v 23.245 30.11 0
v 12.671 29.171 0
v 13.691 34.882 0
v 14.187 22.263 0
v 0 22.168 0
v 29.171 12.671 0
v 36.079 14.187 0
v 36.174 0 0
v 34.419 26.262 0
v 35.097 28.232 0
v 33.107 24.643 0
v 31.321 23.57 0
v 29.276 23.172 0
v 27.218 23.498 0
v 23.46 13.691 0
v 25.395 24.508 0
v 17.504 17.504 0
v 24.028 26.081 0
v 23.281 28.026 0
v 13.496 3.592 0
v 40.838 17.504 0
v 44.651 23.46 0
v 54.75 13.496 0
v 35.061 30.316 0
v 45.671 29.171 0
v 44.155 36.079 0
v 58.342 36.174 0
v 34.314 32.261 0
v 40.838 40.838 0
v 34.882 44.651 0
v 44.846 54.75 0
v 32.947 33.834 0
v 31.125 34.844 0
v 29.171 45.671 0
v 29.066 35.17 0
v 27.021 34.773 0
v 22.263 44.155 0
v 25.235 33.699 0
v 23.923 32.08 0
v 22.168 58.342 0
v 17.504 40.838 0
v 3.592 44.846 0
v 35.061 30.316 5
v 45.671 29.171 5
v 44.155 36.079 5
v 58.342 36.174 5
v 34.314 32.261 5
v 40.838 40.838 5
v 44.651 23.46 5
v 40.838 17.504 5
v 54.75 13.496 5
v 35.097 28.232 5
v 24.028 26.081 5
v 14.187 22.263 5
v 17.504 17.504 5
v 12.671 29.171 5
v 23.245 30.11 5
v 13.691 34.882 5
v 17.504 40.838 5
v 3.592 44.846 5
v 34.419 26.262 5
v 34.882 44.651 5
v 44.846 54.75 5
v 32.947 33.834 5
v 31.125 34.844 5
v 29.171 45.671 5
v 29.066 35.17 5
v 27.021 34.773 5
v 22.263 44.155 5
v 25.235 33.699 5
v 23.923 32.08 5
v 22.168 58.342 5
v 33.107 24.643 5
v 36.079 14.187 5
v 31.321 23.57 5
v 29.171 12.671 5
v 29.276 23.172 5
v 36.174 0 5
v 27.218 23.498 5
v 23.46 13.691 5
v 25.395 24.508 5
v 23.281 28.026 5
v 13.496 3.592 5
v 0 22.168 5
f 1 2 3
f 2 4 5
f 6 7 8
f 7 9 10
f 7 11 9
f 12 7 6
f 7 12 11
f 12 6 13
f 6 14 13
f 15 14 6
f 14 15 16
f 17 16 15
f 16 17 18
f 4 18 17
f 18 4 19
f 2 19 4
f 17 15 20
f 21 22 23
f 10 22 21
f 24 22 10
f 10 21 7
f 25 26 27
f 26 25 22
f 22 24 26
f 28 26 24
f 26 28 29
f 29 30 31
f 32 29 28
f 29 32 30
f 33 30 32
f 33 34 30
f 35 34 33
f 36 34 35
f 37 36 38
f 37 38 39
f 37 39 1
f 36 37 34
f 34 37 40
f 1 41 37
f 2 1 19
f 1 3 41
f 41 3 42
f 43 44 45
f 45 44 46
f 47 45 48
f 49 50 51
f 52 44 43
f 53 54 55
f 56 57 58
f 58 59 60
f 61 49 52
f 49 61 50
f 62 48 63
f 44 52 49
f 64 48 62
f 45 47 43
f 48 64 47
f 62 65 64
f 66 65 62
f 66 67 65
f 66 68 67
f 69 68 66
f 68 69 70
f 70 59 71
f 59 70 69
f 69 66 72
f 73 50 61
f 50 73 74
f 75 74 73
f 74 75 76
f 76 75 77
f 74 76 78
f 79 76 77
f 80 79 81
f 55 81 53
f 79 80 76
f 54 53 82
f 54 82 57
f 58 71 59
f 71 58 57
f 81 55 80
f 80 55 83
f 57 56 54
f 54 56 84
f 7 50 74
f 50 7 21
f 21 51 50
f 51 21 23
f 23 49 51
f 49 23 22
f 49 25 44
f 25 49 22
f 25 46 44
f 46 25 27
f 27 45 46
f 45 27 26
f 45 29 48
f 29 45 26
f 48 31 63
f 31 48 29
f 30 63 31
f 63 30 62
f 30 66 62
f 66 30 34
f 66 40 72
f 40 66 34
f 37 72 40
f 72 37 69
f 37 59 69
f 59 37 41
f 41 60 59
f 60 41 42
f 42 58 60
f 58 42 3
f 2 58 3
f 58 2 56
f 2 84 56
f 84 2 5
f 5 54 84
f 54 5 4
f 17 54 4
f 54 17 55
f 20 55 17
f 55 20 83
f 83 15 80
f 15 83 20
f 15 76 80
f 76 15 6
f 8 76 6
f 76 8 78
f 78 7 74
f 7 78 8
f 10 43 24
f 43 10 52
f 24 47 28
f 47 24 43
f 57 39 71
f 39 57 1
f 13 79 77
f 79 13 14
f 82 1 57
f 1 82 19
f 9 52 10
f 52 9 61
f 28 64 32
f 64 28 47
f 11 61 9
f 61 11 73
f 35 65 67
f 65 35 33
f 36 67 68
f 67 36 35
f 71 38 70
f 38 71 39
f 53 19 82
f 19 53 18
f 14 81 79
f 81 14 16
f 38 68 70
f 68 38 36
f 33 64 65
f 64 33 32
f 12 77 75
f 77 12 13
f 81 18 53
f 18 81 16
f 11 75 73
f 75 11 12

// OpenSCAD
$fn = 32;

// ----------------------------------------------------------------------
// Star wheel: 8-point ratchet, R30
// ----------------------------------------------------------------------

// --- parameters (mm) ---
n_points = 8;             // number of points / teeth
r_out = 30;               // tip radius
r_in = 16.5;              // root radius
bore_r = 6;               // centre bore radius
plate_t = 5;              // plate thickness, Z (extrusion height)
bore_d = 12;              // centre bore diameter

profile = [[45.671, 29.171], [58.342, 36.174], [44.155, 36.079], [40.838, 40.838], [44.846, 54.75], [34.882, 44.651], [29.171, 45.671], [22.168, 58.342], [22.263, 44.155], [17.504, 40.838], [3.592, 44.846], [13.691, 34.882], [12.671, 29.171], [0, 22.168], [14.187, 22.263], [17.504, 17.504], [13.496, 3.592], [23.46, 13.691], [29.171, 12.671], [36.174, 0], [36.079, 14.187], [40.838, 17.504], [54.75, 13.496], [44.651, 23.46]];  // primary outline, 24 points, counter clockwise
void_1 = [[35.061, 30.316], [34.314, 32.261], [32.947, 33.834], [31.125, 34.844], [29.066, 35.17], [27.021, 34.773], [25.235, 33.699], [23.923, 32.08], [23.245, 30.11], [23.281, 28.026], [24.028, 26.081], [25.395, 24.508], [27.218, 23.498], [29.276, 23.172], [31.321, 23.57], [33.107, 24.643], [34.419, 26.262], [35.097, 28.232]];  // centre bore, 18 points

// --- the one profile operation ---
difference() {
  linear_extrude(height = plate_t) polygon(points = profile);
  translate([0, 0, -1])
    linear_extrude(height = plate_t + 2) polygon(points = void_1);
}
